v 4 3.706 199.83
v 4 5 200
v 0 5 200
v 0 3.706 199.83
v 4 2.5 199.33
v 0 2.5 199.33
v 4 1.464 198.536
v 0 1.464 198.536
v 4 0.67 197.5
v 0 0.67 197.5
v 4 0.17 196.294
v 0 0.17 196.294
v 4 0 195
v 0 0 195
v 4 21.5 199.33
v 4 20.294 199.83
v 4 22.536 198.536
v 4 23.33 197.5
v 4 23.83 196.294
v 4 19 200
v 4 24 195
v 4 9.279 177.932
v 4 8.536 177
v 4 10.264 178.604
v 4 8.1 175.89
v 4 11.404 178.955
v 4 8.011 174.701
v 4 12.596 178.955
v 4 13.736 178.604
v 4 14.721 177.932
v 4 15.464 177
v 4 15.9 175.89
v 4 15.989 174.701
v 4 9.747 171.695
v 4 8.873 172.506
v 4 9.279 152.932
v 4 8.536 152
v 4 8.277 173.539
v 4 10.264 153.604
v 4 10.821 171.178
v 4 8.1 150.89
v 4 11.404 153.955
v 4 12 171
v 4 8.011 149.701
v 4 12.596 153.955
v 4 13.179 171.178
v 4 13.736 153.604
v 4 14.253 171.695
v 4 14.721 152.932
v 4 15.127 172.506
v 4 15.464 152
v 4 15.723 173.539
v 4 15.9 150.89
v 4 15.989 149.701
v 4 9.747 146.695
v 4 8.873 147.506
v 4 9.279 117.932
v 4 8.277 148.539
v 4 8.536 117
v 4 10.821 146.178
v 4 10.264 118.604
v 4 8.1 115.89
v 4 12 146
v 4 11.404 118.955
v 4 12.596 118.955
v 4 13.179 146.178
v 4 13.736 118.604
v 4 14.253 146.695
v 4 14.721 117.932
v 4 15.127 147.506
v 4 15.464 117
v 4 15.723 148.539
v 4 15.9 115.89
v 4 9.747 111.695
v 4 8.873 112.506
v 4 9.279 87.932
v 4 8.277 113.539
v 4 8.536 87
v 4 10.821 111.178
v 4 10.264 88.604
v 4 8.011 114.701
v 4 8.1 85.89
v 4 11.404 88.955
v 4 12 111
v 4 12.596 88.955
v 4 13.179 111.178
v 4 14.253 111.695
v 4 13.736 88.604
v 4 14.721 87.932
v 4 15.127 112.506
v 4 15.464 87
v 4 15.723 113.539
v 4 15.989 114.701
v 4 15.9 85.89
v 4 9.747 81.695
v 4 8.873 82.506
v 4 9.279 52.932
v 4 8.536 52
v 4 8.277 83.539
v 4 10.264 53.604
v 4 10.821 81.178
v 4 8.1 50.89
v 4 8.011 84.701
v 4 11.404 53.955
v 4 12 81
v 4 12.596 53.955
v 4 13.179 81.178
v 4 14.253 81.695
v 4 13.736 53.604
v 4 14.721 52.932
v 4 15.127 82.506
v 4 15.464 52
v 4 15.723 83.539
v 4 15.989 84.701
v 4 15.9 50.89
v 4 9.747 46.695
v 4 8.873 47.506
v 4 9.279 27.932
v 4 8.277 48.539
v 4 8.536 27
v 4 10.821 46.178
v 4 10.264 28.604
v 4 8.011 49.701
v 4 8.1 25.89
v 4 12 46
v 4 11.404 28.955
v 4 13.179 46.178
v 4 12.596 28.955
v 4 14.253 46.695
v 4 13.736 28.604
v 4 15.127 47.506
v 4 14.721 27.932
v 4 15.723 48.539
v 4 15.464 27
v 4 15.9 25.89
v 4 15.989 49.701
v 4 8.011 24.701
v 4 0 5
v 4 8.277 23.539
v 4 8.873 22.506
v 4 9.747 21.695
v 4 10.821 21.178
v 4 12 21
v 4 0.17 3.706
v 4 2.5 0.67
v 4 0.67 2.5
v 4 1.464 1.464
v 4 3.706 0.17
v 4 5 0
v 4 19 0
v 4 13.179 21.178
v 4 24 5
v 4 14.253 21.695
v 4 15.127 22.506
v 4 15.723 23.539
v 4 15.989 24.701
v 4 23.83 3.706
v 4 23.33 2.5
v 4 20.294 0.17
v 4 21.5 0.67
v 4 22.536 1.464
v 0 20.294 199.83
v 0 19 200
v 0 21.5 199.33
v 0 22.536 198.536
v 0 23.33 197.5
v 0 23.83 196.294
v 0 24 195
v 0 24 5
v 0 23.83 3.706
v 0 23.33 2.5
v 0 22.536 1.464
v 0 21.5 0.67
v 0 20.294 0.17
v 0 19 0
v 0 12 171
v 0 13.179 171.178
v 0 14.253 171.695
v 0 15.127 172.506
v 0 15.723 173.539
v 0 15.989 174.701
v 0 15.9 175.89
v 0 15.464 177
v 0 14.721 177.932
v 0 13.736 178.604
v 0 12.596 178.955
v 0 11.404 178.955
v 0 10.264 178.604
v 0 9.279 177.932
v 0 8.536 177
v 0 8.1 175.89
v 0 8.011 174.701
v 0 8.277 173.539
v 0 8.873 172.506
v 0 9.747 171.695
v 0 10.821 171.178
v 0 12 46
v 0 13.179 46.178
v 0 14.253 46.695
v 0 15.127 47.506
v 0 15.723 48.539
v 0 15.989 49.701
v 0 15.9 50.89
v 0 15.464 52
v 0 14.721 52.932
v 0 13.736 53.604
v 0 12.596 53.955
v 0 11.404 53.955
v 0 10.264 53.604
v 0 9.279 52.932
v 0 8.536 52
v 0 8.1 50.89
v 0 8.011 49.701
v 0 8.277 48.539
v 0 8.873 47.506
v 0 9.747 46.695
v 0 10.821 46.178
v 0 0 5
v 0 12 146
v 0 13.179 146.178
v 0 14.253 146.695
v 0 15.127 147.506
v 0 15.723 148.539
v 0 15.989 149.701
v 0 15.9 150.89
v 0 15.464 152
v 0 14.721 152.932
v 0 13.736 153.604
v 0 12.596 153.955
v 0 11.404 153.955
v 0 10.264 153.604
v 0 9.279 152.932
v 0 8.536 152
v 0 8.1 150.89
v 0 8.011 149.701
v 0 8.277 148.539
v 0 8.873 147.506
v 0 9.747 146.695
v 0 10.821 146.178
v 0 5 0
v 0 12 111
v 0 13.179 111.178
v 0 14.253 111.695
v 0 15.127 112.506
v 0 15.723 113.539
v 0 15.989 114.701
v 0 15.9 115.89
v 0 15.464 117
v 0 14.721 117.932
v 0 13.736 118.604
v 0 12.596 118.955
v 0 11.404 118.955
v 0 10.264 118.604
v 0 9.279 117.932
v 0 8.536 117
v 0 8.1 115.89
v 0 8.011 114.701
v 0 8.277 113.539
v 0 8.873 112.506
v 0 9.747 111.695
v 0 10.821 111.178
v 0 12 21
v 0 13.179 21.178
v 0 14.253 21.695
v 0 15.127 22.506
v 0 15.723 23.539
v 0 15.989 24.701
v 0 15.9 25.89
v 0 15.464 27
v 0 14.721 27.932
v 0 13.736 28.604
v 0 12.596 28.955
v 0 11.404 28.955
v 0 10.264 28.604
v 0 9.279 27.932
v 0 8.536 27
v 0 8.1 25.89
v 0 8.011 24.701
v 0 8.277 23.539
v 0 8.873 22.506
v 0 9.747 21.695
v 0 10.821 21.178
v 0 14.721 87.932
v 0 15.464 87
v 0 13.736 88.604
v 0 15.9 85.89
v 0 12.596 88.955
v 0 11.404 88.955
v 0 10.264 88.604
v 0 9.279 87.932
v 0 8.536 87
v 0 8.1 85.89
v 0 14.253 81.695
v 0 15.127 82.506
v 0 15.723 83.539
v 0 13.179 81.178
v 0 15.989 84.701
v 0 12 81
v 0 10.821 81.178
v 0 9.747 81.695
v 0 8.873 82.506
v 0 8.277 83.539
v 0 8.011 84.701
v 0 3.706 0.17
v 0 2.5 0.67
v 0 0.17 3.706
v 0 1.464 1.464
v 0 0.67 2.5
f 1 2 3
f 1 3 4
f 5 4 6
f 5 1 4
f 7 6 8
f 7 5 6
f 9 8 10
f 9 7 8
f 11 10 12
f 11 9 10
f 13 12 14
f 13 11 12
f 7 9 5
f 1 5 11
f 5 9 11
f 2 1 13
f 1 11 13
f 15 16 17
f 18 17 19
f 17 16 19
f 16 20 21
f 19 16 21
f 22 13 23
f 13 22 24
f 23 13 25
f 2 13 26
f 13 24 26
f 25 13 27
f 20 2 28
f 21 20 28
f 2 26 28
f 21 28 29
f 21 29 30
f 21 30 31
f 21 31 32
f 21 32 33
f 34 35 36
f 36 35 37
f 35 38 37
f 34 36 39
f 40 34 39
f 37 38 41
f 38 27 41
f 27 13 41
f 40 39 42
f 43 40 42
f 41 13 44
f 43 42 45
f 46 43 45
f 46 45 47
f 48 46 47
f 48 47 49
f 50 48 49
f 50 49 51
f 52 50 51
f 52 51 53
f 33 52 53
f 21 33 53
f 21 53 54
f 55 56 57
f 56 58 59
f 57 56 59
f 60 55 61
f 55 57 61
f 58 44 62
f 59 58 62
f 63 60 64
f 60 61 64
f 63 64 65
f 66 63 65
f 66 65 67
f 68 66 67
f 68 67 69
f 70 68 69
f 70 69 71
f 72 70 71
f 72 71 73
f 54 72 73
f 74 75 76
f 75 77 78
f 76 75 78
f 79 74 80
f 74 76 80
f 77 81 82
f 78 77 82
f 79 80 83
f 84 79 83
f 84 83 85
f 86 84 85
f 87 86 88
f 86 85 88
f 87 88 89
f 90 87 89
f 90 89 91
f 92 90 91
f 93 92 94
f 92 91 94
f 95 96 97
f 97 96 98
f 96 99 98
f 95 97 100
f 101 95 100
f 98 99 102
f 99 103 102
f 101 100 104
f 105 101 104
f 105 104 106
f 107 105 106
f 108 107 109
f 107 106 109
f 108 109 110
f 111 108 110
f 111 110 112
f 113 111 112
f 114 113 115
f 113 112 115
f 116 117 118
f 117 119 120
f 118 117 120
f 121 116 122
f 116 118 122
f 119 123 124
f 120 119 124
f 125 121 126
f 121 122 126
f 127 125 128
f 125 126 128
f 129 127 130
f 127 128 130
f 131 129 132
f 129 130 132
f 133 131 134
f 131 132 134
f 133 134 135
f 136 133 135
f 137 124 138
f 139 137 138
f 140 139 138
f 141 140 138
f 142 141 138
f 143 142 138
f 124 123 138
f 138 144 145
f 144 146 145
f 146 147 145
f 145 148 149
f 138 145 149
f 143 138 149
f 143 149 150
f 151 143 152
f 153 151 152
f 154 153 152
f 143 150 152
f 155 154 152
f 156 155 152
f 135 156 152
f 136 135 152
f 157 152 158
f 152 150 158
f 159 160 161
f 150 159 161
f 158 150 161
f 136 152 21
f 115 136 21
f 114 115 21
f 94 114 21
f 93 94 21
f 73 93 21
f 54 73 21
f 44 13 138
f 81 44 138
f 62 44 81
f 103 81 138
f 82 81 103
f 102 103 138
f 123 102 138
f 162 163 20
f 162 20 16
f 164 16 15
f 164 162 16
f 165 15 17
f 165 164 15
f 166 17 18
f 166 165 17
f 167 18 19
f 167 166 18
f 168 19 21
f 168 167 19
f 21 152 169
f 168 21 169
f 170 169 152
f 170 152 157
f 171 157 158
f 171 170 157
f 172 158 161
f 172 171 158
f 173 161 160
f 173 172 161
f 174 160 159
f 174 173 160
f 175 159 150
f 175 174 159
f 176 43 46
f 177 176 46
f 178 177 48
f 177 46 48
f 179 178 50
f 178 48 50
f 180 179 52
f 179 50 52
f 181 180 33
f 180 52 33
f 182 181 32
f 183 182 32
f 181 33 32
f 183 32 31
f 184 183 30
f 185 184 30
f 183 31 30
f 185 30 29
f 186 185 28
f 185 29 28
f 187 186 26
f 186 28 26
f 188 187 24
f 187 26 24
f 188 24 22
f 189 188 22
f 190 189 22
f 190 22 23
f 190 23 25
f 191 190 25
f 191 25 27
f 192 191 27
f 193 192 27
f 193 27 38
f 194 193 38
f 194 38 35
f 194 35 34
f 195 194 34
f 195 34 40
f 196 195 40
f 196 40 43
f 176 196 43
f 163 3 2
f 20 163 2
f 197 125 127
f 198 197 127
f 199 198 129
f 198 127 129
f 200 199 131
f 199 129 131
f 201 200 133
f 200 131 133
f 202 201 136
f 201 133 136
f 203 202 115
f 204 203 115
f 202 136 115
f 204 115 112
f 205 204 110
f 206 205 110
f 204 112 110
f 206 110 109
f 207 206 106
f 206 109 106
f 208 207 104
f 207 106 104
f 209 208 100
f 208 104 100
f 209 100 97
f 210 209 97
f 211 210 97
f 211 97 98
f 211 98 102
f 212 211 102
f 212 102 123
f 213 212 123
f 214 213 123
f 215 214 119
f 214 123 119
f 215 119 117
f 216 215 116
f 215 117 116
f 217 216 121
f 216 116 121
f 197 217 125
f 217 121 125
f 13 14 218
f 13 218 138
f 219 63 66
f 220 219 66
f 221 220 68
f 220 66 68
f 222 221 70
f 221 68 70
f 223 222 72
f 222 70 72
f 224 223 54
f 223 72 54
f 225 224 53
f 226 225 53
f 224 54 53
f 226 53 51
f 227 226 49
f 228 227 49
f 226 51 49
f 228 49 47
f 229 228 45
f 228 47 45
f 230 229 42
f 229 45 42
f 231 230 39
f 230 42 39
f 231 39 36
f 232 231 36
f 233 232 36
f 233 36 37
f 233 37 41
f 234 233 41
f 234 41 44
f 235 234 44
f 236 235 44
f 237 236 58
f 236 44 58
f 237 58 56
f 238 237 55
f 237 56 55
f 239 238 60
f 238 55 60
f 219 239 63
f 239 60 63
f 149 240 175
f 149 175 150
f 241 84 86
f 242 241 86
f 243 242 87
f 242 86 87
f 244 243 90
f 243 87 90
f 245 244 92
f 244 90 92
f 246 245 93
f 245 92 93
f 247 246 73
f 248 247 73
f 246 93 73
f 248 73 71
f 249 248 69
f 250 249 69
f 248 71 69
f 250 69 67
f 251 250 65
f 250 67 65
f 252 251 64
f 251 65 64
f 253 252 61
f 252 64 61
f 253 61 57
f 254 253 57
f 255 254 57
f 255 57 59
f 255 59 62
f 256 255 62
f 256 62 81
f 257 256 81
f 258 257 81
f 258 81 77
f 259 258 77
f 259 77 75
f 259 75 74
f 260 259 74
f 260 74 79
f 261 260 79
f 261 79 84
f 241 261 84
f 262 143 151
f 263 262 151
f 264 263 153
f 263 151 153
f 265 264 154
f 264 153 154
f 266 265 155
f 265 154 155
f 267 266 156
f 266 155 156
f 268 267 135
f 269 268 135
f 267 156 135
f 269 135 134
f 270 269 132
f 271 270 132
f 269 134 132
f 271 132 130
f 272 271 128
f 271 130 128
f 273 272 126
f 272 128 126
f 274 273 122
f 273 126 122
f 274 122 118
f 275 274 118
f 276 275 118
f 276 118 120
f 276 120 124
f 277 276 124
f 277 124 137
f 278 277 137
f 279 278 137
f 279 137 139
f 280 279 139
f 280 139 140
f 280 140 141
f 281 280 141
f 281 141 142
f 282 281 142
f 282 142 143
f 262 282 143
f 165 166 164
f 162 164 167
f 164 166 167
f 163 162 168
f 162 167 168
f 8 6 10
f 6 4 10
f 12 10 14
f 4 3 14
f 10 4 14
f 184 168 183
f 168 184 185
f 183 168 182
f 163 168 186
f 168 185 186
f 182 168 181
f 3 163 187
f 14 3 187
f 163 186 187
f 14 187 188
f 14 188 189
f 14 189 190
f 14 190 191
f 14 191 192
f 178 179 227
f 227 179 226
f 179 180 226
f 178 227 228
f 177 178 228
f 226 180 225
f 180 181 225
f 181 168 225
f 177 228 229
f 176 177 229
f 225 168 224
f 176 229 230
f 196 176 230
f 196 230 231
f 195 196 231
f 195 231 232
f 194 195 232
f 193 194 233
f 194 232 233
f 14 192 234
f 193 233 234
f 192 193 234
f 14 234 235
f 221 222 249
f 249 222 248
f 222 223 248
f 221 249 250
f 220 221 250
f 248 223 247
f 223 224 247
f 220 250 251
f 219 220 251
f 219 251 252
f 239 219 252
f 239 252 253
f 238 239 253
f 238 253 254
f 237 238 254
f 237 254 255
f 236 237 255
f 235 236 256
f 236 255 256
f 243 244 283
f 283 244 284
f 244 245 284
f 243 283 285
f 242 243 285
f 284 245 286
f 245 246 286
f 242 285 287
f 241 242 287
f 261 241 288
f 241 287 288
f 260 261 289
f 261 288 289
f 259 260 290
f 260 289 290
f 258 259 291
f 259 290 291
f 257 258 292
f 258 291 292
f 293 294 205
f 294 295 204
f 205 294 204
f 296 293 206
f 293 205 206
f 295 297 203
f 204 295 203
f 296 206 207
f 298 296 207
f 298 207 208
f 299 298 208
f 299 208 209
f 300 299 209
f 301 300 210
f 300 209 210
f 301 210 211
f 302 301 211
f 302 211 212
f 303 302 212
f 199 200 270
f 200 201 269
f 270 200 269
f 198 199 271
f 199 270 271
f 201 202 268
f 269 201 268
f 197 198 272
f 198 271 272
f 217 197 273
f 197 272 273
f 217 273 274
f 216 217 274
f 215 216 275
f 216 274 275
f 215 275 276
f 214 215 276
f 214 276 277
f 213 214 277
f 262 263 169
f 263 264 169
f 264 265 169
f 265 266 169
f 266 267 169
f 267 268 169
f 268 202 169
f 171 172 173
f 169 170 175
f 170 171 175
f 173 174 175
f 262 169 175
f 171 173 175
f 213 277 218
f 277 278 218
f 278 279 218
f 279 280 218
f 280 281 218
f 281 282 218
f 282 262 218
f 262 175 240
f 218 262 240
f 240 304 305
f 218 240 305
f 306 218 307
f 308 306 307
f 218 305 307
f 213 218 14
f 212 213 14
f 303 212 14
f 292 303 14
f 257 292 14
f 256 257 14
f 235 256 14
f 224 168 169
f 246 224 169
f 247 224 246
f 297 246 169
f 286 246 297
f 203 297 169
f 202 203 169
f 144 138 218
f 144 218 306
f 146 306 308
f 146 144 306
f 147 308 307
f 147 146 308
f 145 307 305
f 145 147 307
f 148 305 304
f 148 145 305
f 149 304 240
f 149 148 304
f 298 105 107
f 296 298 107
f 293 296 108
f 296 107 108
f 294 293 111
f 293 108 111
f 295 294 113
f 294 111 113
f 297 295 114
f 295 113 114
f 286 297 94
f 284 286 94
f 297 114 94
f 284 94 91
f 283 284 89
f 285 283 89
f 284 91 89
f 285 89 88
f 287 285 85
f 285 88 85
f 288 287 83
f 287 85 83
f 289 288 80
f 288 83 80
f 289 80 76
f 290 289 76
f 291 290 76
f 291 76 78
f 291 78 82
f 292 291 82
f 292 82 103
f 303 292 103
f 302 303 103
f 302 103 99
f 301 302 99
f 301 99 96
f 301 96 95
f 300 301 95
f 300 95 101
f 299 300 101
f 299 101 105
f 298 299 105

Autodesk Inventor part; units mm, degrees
ref_plane "YZ Plane" through (0, 0, 0) normal (1, 0, 0) x (0, 1, 0)
ref_plane "XZ Plane" through (0, 0, 0) normal (0, 1, 0) x (-1, 0, 0)
ref_plane "XY Plane" through (0, 0, 0) normal (0, 0, 1) x (1, 0, 0)
sketch "Sketch1" plane through (0, 0, 0) normal (0, 0, 1) x (1, 0, 0)
  line L0 (0, 0) -> (4, 0)
  line L1 (4, 0) -> (4, 24)
  line L2 (4, 24) -> (0, 24)
  line L3 (0, 24) -> (0, 0)
  dimension "d0" = 4
  dimension "d1" = 24
extrude "Extrusion1" add sketch "Sketch1" along normal blind 200
fillet "Fillet1" radius 5 4 edges at (2, 24, 200) (2, 0, 200) (2, 24, 0) (2, 0, 0)
sketch "Sketch2" plane through (4, 5, 0) normal (1, 0, 0) x (0, 0, -1)
  circle A0 centre (-50, 7) radius 4
  circle A1 centre (-150, 7) radius 4
  line L0 (-200, 0) -> (-200, 14) projected
  line L1 (0, 0) -> (0, 14) projected
  line L2 (-5, 19) -> (-195, 19) projected
  circle A2 centre (-175, 7) radius 4
  circle A3 centre (-25, 7) radius 4
  circle A4 centre (-115, 7) radius 4
  circle A5 centre (-85, 7) radius 4
  point P0 (0, -5)
  dimension "d5" = 8
  dimension "d6" = 8
  dimension "d9" = 50
  dimension "d10" = 50
  dimension "d11" = 12
  dimension "d12" = 12
  dimension "d13" = 8
  dimension "d14" = 8
  dimension "d15" = 8
  dimension "d16" = 8
  dimension "d17" = 25
  dimension "d18" = 25
  dimension "d19" = 85
  dimension "d20" = 85
extrude "Extrusion2" cut sketch "Sketch2" against normal up to surface (4 mm away)
sketch "Sketch3" plane through (4, 5, 0) normal (1, 0, 0) x (0, 0, -1)
  point P0 (0, -5)
properties part number "mocowanie zawieszenia"
